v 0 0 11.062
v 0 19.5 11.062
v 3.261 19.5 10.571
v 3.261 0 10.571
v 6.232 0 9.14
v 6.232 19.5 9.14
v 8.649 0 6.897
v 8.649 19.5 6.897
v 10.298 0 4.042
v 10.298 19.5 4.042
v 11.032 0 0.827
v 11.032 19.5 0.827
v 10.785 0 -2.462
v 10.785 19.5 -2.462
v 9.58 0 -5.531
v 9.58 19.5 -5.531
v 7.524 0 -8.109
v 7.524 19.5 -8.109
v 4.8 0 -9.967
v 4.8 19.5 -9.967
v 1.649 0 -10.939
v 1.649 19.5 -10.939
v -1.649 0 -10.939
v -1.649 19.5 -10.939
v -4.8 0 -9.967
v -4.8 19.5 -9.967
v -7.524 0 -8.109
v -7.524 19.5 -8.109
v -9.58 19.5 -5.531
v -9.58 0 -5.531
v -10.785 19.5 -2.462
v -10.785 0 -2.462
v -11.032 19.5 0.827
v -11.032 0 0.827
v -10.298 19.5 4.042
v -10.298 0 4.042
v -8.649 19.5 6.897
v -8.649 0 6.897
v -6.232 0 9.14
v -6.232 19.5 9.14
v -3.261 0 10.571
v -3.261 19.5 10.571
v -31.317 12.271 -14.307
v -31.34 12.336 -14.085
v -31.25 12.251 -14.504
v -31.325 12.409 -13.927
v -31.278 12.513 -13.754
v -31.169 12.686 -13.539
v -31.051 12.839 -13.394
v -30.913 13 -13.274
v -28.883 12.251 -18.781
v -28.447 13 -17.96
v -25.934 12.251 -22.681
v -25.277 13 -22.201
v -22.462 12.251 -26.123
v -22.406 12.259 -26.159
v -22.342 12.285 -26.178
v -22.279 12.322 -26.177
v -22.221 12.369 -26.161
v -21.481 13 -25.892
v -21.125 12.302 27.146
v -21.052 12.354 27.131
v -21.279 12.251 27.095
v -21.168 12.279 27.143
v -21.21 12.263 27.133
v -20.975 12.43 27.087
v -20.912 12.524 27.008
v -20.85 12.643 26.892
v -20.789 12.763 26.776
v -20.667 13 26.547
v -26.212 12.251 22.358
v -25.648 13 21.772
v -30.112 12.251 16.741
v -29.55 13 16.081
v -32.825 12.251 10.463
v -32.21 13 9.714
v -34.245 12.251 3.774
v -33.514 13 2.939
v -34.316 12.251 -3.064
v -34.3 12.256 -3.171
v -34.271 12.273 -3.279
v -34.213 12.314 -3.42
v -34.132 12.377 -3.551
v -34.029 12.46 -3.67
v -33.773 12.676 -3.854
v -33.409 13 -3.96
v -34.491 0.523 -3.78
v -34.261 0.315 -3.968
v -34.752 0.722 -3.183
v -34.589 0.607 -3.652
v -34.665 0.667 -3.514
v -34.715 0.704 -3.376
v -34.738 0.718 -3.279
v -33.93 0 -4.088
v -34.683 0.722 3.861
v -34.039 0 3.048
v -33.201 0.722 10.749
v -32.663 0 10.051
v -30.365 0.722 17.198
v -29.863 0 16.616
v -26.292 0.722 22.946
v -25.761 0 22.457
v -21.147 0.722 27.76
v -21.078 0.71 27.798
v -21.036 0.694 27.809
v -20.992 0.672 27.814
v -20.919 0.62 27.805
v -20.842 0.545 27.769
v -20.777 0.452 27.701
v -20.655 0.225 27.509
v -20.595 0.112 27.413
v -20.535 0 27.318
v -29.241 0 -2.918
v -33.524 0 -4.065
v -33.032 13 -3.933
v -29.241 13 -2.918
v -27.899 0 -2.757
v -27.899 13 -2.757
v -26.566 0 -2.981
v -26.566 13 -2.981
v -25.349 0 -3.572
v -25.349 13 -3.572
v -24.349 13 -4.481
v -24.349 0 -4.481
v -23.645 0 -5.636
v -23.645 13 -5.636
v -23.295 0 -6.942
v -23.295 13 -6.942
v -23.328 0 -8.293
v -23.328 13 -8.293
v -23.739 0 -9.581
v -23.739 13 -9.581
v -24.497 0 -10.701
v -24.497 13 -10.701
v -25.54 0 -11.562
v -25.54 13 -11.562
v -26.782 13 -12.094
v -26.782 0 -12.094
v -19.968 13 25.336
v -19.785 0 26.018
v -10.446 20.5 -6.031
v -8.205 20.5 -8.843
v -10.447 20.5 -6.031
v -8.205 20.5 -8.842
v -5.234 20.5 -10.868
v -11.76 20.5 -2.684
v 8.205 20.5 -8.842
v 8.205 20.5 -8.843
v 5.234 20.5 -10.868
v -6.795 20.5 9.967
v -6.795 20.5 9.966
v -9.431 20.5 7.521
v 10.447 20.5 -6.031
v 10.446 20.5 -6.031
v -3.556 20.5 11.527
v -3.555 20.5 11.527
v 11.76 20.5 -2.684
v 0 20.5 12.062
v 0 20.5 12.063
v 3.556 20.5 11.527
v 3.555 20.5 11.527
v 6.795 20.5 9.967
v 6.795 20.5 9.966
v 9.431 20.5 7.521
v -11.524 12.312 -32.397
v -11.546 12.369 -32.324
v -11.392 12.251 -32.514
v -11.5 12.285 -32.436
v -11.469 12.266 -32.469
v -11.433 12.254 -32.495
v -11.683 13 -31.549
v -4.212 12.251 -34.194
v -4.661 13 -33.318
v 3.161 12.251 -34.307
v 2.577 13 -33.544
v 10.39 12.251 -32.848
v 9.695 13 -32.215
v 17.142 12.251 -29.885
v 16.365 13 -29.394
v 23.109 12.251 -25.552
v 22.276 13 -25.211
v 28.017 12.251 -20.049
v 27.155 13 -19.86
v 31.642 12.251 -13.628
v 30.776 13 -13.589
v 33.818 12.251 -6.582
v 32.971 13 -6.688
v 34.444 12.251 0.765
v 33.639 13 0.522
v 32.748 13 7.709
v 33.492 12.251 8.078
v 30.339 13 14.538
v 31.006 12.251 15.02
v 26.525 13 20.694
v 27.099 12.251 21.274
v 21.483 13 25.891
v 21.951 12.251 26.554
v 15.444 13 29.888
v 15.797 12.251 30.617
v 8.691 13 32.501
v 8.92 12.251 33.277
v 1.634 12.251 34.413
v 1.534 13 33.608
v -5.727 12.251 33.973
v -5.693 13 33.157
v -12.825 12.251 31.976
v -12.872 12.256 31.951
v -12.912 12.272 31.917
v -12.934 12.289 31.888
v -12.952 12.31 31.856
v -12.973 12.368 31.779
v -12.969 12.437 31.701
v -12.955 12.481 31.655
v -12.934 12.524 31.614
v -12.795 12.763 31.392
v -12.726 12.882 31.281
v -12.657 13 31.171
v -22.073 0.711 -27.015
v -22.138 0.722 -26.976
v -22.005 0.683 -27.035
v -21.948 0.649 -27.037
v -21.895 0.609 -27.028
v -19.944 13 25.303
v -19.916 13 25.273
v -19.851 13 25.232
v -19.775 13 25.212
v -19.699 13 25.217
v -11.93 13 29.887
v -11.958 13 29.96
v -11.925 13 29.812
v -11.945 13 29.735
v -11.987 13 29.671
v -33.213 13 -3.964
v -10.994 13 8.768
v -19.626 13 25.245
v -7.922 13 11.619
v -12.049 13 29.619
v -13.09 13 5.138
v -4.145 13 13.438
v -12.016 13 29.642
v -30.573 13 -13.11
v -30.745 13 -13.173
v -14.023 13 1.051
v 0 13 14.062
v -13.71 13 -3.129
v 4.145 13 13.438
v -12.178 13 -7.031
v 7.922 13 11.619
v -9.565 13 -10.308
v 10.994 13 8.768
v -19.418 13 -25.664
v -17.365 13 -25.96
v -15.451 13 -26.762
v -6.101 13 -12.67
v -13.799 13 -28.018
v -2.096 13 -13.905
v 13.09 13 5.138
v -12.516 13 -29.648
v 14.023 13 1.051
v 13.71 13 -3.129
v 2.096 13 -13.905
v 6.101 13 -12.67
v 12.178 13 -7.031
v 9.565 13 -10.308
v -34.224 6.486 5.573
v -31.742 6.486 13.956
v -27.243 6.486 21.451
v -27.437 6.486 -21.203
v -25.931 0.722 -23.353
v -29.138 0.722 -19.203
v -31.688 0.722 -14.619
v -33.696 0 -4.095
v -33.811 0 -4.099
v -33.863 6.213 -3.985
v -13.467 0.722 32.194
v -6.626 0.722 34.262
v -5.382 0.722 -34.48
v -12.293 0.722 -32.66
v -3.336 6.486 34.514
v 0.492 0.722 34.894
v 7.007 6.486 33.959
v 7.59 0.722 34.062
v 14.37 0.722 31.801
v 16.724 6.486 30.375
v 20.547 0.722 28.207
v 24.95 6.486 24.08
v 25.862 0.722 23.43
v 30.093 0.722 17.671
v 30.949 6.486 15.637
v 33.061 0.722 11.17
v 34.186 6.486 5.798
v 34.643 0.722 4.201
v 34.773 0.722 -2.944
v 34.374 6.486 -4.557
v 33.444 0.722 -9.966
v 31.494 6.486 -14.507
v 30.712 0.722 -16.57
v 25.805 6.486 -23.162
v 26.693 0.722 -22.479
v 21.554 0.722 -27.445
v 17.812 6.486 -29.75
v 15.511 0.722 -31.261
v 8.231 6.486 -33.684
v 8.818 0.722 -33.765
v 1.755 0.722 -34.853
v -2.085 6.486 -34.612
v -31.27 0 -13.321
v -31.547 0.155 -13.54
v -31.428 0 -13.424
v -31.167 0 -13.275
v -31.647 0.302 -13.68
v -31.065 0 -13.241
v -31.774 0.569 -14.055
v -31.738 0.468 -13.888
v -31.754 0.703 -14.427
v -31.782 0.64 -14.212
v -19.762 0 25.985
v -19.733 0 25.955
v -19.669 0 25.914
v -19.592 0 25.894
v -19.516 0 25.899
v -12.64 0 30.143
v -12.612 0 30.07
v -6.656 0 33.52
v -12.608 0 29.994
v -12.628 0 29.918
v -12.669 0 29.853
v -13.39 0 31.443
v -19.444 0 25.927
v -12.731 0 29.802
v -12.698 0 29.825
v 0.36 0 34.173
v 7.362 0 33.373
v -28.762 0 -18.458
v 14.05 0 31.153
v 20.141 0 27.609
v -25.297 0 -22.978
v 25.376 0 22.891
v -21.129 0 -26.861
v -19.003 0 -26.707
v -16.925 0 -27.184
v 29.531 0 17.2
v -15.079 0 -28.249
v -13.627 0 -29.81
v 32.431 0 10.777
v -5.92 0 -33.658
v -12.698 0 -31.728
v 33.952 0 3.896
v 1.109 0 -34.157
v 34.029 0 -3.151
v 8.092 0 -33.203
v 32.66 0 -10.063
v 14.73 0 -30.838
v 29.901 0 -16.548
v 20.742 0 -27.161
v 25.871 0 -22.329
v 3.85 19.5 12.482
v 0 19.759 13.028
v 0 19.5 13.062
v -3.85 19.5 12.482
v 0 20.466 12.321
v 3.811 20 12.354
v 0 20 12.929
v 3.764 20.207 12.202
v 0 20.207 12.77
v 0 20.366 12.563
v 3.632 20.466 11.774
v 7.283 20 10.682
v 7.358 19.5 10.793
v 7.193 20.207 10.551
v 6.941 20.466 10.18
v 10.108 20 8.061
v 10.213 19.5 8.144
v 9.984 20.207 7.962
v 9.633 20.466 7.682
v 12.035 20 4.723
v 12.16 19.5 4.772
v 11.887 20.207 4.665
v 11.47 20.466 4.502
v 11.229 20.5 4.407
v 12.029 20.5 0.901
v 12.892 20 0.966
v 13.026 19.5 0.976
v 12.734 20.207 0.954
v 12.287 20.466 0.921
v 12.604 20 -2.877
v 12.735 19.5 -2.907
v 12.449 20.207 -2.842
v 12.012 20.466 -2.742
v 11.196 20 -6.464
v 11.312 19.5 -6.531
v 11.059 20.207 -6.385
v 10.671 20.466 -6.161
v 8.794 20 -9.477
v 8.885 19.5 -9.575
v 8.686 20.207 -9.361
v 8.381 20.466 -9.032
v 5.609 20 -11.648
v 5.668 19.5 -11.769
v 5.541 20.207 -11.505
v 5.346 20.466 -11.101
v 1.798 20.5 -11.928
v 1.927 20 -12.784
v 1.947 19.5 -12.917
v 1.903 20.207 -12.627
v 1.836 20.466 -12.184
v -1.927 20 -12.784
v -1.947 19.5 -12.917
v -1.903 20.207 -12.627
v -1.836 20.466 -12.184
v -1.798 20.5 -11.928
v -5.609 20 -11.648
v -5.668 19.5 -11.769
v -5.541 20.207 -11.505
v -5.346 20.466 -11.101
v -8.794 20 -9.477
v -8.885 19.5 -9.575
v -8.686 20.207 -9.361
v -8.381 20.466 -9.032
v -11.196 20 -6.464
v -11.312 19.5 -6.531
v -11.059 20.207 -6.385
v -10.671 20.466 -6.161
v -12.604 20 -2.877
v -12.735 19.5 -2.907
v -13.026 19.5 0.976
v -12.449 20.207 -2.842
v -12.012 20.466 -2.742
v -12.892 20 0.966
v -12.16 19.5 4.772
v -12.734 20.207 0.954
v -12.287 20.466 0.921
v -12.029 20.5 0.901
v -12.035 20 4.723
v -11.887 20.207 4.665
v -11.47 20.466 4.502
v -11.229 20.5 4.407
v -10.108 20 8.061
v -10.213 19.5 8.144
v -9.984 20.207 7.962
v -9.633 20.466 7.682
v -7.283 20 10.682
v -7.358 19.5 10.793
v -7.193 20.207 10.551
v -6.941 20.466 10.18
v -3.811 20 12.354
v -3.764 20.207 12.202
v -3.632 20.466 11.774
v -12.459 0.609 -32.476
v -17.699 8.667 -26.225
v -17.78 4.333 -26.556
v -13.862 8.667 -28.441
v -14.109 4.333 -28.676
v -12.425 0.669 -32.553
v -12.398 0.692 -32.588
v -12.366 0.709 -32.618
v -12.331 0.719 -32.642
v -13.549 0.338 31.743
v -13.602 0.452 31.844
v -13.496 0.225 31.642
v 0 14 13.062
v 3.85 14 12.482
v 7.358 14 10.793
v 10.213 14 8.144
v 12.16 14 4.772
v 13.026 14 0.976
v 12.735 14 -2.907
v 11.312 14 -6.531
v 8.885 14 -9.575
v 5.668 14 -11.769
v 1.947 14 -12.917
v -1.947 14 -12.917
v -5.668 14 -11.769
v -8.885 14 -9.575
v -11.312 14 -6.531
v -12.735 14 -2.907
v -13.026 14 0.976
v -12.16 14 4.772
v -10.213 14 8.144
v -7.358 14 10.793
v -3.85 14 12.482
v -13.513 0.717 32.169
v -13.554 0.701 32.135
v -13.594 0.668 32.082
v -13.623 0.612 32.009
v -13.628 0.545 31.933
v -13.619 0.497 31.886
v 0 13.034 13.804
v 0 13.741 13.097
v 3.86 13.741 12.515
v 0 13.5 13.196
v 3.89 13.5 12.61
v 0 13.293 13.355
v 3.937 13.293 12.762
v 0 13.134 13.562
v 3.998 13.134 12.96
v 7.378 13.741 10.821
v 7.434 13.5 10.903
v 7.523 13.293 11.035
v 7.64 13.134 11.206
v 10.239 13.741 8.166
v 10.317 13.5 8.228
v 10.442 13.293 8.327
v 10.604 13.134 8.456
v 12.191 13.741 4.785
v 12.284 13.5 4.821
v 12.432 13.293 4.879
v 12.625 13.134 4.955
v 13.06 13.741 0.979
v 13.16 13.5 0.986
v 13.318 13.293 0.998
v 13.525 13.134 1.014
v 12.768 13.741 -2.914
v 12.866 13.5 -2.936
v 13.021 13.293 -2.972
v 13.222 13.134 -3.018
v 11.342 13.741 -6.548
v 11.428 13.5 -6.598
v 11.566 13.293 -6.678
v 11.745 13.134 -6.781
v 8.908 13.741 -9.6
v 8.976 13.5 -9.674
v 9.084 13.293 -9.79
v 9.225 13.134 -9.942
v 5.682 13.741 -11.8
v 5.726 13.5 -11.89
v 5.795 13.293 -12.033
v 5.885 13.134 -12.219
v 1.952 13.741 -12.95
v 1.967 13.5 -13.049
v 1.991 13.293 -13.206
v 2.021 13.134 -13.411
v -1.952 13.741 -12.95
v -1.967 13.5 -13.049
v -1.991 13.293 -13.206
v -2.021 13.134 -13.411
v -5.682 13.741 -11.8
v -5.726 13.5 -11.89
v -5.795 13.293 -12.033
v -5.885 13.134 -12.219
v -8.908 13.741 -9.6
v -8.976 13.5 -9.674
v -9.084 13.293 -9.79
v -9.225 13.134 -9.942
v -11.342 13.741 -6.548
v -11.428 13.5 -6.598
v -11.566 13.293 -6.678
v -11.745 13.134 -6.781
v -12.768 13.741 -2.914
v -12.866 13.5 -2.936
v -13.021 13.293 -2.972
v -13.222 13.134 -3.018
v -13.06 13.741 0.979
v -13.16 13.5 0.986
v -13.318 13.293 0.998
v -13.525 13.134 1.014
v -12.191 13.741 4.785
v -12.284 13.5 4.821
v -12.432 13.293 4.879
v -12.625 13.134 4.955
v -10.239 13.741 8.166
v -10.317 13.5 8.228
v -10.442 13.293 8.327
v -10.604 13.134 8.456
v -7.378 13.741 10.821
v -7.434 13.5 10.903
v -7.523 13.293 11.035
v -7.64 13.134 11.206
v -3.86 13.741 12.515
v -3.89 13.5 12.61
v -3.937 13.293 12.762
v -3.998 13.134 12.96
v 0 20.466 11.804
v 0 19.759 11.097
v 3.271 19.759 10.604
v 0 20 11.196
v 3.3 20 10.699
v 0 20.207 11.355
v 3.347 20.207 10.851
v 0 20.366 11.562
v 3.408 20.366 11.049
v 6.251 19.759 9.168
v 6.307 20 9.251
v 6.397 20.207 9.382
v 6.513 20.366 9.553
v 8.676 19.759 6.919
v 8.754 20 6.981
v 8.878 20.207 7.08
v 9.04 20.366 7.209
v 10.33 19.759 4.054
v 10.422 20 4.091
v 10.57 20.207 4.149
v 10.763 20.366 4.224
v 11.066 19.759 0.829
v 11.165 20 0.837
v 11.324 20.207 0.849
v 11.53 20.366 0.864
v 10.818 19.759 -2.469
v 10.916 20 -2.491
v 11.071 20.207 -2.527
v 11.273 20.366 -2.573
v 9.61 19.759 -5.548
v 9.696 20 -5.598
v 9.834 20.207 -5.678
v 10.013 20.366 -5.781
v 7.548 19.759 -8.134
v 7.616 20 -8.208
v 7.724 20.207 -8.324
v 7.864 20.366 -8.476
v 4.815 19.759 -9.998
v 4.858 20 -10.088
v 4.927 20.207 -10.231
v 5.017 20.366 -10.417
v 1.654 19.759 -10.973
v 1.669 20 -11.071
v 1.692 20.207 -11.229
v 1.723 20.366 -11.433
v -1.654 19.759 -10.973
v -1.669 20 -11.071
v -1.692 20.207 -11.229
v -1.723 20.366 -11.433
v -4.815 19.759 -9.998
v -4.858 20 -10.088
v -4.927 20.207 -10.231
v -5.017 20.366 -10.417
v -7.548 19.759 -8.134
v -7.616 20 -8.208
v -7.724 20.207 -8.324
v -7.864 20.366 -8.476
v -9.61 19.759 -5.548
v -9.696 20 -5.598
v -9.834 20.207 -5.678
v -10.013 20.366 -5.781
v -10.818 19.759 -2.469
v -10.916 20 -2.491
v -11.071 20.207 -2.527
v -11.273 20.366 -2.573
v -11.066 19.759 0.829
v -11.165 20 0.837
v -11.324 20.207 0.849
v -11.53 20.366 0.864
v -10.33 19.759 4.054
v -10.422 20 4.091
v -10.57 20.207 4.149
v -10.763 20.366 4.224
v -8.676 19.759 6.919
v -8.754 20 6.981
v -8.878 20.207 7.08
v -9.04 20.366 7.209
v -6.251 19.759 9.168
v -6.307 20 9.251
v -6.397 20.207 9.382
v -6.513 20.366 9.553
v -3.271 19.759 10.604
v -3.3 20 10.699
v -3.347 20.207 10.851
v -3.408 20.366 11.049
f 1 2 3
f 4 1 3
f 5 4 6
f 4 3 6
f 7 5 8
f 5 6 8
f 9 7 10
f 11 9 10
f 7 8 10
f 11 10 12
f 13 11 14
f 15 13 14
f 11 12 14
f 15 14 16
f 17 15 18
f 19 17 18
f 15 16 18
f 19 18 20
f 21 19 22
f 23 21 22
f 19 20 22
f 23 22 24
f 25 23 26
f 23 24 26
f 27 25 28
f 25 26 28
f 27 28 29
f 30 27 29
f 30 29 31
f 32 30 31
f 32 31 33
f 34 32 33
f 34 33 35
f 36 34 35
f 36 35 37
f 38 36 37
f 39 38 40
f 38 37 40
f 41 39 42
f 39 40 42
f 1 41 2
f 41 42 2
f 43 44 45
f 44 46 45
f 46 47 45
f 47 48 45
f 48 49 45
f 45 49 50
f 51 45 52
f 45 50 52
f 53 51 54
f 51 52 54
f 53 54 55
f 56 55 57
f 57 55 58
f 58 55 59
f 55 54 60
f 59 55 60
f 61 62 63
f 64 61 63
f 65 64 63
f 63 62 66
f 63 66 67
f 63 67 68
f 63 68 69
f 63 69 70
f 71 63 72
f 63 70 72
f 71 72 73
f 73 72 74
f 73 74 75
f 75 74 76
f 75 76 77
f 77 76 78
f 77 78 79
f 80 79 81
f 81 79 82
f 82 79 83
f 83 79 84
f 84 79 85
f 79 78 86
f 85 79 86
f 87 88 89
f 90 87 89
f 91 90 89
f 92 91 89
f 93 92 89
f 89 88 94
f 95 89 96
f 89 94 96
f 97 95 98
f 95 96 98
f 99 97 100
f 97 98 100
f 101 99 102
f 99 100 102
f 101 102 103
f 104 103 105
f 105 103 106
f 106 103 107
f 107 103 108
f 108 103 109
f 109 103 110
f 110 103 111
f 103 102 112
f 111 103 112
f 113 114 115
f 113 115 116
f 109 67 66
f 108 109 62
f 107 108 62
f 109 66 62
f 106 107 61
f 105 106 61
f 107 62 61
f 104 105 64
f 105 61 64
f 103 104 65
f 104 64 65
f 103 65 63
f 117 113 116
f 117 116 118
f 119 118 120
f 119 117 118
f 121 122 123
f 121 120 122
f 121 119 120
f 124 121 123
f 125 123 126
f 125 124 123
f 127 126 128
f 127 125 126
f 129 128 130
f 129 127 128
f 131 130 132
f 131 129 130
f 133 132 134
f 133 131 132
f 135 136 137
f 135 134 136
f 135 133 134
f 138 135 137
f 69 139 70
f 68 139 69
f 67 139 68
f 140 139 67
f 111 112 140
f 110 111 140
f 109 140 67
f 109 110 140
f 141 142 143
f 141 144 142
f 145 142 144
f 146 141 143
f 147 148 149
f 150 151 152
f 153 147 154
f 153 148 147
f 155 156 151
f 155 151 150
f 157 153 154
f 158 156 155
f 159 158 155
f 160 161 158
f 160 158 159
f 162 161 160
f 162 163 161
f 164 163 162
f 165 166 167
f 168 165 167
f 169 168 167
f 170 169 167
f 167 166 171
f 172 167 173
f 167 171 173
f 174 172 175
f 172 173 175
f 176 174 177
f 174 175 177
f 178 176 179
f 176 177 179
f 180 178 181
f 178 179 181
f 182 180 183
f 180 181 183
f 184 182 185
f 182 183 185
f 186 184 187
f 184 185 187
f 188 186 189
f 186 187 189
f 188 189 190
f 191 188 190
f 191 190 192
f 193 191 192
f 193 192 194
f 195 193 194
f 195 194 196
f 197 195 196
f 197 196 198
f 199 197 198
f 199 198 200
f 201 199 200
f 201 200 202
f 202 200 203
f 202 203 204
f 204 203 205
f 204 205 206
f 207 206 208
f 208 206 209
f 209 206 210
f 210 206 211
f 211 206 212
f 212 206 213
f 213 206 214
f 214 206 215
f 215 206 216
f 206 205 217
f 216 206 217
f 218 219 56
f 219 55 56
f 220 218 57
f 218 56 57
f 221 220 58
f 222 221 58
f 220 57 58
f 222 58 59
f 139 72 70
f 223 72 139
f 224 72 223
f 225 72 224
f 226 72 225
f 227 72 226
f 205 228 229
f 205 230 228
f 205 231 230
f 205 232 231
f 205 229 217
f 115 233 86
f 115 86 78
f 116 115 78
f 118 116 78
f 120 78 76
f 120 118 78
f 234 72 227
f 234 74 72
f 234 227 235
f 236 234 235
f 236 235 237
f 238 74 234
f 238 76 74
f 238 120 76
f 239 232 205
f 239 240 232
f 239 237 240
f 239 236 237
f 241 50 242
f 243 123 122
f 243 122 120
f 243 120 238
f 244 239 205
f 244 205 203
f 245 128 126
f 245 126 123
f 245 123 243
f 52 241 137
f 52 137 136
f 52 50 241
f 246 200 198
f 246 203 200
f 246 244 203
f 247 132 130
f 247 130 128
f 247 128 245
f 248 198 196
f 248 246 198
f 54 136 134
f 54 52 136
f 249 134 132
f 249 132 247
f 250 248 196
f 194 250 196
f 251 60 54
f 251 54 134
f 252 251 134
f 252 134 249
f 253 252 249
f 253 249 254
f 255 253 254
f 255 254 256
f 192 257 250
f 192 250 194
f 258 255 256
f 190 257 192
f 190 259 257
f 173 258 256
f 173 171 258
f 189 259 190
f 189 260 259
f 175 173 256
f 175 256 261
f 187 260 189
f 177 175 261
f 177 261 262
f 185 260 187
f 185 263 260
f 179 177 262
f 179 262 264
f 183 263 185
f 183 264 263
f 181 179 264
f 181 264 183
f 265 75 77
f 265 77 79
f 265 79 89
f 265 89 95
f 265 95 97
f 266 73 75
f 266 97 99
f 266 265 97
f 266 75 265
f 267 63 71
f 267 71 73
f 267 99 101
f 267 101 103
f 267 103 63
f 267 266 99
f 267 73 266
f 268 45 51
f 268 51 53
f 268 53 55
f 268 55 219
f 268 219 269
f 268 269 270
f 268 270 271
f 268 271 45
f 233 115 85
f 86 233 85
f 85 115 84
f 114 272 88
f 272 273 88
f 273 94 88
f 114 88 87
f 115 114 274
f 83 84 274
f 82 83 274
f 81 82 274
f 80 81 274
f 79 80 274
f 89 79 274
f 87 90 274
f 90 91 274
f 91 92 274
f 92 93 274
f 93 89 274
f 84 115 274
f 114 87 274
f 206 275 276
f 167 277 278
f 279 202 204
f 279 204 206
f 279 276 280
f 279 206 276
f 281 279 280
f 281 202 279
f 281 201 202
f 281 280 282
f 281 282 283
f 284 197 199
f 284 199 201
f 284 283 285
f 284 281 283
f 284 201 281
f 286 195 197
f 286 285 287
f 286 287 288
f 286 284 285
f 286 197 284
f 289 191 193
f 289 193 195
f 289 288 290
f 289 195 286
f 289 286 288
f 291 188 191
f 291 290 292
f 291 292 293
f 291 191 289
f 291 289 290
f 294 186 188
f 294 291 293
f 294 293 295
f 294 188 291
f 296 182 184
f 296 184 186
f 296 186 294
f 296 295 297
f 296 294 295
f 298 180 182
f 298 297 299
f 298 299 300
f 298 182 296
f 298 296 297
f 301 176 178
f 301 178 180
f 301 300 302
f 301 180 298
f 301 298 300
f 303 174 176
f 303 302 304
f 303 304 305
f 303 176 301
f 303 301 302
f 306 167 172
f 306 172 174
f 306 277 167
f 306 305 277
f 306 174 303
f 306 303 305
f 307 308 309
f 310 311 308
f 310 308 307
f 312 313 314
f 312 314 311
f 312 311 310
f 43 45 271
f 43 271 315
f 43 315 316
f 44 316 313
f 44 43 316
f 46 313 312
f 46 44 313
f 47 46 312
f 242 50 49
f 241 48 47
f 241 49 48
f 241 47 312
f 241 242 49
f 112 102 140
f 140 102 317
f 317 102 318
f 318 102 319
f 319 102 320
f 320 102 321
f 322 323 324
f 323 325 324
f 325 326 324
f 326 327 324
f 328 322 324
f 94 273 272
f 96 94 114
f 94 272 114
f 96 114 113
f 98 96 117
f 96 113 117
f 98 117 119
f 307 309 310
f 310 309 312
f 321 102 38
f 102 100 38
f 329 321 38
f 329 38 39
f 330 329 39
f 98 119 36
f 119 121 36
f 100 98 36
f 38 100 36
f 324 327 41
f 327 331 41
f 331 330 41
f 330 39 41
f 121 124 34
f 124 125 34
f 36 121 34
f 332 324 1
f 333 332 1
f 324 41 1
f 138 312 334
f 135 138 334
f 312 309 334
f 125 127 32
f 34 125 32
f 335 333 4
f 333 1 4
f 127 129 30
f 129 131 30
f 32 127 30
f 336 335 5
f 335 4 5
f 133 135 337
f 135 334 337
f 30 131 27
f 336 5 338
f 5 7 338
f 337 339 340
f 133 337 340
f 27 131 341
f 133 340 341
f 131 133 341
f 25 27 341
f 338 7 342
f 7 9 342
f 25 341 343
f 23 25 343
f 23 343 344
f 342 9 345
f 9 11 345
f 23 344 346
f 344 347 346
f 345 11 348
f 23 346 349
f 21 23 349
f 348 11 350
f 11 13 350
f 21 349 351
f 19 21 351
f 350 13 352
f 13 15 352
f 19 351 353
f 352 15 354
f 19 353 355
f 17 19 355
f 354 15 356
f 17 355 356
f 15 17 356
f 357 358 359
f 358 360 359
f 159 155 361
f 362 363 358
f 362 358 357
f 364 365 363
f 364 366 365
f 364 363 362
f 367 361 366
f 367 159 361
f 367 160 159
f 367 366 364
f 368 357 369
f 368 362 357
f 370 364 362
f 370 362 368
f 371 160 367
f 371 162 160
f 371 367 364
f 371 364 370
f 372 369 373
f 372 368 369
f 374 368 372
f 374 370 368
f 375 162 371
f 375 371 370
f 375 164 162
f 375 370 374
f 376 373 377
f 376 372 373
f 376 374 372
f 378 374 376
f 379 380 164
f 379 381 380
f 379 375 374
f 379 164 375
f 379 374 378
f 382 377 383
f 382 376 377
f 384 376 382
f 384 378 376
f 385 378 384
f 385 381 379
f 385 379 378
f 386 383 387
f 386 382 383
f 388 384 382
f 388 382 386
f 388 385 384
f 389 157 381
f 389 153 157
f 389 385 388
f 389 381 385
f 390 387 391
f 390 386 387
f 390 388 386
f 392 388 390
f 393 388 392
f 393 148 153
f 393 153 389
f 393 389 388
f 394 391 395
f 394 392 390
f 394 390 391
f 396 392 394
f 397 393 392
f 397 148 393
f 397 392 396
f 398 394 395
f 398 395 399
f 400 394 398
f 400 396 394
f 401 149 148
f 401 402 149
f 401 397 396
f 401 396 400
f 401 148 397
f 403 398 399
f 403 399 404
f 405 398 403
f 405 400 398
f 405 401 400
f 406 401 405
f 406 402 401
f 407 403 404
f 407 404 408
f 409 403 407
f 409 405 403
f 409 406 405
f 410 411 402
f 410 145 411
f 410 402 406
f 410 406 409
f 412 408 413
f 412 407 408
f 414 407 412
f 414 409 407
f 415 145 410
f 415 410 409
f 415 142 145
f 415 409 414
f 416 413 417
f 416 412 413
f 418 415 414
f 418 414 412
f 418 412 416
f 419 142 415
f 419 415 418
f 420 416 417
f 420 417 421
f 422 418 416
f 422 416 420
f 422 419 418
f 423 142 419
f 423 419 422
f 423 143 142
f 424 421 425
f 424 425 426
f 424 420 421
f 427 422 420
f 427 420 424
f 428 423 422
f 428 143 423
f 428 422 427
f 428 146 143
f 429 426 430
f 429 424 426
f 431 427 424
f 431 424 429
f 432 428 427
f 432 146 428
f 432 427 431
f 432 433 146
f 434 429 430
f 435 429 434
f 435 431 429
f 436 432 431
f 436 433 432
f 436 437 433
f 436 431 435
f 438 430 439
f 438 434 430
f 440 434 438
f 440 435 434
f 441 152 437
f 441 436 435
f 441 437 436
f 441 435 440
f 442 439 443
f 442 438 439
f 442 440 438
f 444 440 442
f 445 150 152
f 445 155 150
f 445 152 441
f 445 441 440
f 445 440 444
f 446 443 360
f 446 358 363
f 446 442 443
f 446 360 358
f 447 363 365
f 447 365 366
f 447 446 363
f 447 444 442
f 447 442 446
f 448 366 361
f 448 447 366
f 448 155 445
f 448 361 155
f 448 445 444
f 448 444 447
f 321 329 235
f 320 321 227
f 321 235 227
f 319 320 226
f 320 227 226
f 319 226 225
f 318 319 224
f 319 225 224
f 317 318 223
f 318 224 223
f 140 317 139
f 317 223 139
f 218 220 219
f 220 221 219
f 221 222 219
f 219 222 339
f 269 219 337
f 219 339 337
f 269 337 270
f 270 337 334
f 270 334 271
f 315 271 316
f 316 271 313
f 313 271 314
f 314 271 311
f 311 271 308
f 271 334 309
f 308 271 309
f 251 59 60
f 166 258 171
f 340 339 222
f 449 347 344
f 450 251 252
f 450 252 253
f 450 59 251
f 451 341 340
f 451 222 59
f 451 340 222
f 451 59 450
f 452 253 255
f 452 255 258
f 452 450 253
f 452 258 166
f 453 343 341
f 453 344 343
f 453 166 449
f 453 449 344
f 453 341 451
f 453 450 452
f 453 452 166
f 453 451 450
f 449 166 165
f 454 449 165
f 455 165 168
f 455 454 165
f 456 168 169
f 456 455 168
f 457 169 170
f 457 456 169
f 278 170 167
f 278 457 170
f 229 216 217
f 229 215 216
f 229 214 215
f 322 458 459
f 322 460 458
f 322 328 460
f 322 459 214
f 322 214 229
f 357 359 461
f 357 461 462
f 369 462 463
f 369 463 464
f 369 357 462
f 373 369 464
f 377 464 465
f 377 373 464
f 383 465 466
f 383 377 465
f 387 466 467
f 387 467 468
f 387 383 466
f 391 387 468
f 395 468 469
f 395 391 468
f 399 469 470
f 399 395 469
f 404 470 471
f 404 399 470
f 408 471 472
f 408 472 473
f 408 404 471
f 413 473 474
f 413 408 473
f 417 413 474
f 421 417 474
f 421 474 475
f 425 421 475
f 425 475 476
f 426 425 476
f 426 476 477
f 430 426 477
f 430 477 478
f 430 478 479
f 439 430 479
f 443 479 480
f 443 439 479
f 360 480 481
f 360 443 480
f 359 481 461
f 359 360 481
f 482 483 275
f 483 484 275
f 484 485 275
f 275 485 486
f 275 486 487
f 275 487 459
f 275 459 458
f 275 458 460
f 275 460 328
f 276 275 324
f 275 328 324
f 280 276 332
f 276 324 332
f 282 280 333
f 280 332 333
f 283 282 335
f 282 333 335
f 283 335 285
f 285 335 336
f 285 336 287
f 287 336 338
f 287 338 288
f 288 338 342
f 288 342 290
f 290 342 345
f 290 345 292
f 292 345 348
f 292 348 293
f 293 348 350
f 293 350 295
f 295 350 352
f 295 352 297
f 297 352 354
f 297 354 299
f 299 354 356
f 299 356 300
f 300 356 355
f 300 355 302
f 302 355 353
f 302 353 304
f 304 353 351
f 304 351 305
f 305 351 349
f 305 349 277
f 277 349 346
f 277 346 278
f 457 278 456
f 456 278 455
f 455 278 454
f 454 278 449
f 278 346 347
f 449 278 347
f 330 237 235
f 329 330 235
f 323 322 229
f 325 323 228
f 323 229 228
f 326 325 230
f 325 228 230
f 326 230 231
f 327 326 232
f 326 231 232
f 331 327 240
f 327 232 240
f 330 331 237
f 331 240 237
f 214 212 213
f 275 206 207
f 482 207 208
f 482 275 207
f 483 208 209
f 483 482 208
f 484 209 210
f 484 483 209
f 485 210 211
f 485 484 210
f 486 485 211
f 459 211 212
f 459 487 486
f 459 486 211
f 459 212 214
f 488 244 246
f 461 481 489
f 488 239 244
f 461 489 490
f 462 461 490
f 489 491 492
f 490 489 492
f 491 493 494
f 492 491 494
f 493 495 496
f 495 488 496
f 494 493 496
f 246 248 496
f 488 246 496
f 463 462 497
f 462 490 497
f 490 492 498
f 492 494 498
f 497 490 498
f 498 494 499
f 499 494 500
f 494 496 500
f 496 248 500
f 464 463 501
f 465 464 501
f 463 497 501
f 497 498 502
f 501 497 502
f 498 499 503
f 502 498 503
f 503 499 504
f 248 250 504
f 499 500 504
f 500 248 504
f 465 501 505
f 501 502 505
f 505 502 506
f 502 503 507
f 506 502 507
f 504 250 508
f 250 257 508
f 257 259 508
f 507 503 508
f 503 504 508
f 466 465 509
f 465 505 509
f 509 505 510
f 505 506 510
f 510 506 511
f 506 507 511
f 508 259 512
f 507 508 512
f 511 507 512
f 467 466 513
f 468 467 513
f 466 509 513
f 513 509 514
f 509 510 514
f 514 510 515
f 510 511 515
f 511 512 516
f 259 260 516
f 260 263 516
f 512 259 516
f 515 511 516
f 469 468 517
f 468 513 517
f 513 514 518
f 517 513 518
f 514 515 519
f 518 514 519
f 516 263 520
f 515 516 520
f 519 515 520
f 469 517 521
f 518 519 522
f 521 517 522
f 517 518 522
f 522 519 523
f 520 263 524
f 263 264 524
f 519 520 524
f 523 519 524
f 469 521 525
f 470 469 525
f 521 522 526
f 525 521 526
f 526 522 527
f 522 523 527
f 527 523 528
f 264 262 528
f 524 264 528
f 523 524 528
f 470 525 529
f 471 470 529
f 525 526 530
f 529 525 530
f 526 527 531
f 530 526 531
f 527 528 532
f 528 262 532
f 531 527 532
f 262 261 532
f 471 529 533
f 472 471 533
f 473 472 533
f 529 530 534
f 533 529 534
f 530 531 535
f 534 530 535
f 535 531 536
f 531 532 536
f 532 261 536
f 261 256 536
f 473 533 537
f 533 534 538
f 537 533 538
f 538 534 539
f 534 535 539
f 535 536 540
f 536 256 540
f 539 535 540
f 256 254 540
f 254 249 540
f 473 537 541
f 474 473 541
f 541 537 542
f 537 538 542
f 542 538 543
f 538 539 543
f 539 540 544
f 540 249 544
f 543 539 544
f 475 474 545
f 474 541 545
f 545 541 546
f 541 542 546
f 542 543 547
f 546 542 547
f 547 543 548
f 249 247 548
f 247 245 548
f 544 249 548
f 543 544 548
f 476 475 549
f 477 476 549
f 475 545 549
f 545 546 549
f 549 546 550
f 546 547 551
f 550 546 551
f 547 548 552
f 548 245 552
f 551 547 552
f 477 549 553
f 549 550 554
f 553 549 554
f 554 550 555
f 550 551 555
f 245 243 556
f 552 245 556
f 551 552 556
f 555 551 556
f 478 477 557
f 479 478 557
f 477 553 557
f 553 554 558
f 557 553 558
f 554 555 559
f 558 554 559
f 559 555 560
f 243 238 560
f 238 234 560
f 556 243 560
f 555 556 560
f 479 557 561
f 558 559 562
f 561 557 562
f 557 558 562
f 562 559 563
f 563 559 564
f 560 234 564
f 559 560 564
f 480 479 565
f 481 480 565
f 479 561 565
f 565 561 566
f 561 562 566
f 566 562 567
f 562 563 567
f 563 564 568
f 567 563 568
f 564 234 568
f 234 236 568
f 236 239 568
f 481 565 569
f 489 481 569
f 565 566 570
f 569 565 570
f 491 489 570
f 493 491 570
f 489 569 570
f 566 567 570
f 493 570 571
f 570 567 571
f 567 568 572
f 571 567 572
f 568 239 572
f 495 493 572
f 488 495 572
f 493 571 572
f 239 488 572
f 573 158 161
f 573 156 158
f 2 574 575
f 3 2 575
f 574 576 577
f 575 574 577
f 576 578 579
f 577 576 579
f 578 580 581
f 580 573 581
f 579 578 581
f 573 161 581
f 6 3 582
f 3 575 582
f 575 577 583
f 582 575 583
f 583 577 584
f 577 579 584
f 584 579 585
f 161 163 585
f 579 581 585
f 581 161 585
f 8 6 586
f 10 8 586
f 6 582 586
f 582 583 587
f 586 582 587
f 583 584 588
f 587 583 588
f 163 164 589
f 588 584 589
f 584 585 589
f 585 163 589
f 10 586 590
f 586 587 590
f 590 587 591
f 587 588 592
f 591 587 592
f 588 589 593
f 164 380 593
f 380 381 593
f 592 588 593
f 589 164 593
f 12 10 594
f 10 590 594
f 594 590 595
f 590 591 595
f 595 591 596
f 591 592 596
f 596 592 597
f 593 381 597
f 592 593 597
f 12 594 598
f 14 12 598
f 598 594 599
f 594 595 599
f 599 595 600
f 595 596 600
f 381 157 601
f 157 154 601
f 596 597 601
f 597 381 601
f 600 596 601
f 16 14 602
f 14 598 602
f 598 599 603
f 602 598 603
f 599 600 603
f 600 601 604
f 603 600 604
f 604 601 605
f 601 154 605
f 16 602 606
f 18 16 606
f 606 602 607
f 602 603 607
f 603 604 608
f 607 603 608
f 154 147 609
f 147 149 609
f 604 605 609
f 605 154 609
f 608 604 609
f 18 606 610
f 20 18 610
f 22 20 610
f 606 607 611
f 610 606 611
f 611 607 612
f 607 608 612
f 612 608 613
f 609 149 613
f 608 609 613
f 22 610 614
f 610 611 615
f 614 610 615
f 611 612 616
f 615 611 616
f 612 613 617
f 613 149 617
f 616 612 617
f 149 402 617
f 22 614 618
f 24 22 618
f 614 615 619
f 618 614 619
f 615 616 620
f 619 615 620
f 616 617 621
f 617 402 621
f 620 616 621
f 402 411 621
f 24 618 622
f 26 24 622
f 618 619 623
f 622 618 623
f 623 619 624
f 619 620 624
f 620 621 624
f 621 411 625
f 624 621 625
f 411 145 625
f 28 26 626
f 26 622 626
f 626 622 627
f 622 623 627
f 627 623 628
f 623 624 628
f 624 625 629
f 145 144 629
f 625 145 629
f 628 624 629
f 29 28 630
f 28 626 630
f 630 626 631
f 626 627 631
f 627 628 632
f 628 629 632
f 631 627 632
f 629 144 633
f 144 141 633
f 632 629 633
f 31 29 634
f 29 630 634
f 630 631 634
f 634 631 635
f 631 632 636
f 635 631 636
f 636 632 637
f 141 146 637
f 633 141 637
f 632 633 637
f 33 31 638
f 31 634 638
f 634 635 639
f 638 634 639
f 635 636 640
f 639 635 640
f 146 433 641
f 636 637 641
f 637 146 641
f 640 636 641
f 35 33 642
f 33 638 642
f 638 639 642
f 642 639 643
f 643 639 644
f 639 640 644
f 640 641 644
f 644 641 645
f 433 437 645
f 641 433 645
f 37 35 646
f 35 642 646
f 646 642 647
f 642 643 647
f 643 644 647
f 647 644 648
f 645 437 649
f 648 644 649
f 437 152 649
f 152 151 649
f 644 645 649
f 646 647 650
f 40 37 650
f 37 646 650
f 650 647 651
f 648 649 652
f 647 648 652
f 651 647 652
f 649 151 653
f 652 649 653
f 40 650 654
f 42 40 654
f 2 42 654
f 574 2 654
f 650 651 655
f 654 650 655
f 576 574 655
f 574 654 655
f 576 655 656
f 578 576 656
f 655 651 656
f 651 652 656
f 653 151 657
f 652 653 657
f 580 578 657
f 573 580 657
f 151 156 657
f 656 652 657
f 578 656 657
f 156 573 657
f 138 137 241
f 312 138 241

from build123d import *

# Parameters (mm, degrees)
SKETCH1_R           = 34.925
BOSS_EXTRUDE1_DEPTH = 13
BOSS_EXTRUDE1_TAPER = 2.21
CHAMFER1_SIZE       = 0.722669775
CHAMFER1_SIZE_2     = 0.75
CHAMFER1_SIZE_3     = 0.780685639
CUT_EXTRUDE1_DEPTH  = 13
CUT_EXTRUDE1_DRAFT  = -4.5
CUT_EXTRUDE2_DEPTH  = 13
CUT_EXTRUDE2_DRAFT  = -2.2
CUT_EXTRUDE4_DEPTH  = 17.5
FILLET1_R           = 0.25
SKETCH6_R           = 11.0625
CUT_EXTRUDE3_DEPTH  = 13
BOSS_EXTRUDE2_START = 7.5
SKETCH7_R           = 13.0625
SKETCH7_R_2         = 11.0625
BOSS_EXTRUDE2_DEPTH = 7.5
FILLET2_R           = 1


# Some blends are built 0.0001 mm under size
with BuildPart() as part:
    # Sketch1 → Boss-Extrude1 (new body)
    with BuildSketch(Plane(origin=(0, 0, 0), x_dir=(1, 0, 0), z_dir=(0, 1, 0))):
        Circle(SKETCH1_R)
    extrude(amount=BOSS_EXTRUDE1_DEPTH, taper=BOSS_EXTRUDE1_TAPER)

    # Chamfer1
    # the kernel refuses this chamfer: 0.780685639, 0.75, 0.722669775 mm, written as the material it takes off along each edge
    with BuildSketch(Plane(origin=(0, 0, 0), x_dir=(1, 0, 0), z_dir=(0, 0, 1))) as chamfer1_piece_1:
        Polygon((34.925 - CHAMFER1_SIZE * 0.038562212794, CHAMFER1_SIZE * 0.999256201571), (34.925 - CHAMFER1_SIZE_2, 0), (34.925, 0), align=None)
    revolve(axis=Axis((0, 0, 0), (0, 1, 0)), mode=Mode.SUBTRACT)
    with BuildSketch(Plane(origin=(0, 13, 0), x_dir=(1, 0, 0), z_dir=(0, 0, -1))) as chamfer1_piece_2:
        Polygon((34.423318083 + CHAMFER1_SIZE_2 * 0.0385622127818, CHAMFER1_SIZE_2 * 0.999256201254), (34.423318083 - CHAMFER1_SIZE_3, 0), (34.423318083, 0), align=None)
    revolve(axis=Axis((0, 13, 0), (0, -1, 0)), mode=Mode.SUBTRACT)


with BuildPart() as cut_extrude1_tool:
    # Sketch3 → Cut-Extrude1 (with draft: the straight prism first)
    with BuildSketch(Plane(origin=(0, 0, 0), x_dir=(1, 0, 0), z_dir=(0, 1, 0))):
        with BuildLine():
            ThreePointArc((-22.007744855, 27.11853225), (-15.962331288, 27.647568798), (-12.481465414, 32.61853225))
            ThreePointArc((-12.481465414, 32.61853225), (-17.4625, 30.245937227), (-22.007744855, 27.11853225))
        make_face()
    extrude(amount=CUT_EXTRUDE1_DEPTH)
    # Cut-Extrude1: the draft: its side faces are tilted about the plane it starts from
    cut_extrude1_sides = [cut_extrude1_tool.faces().sort_by_distance(p)[0] for p in [
        (-15.962331288, 6.5, -27.647568798),
        (-17.4625, 6.5, -30.245937227),
    ]]
    draft(cut_extrude1_sides, Plane(origin=(0, 0, 0), x_dir=(1, 0, 0), z_dir=(0, 1, 0)), CUT_EXTRUDE1_DRAFT)


with BuildPart() as part_1:
    add(part.part)

    # Cut-Extrude1: cut by cut_extrude1_tool
    add(cut_extrude1_tool.part, mode=Mode.SUBTRACT)


with BuildPart() as cut_extrude2_tool:
    # Sketch5 → Cut-Extrude2 (with draft: the straight prism first)
    with BuildSketch(Plane(origin=(0, 0, 0), x_dir=(1, 0, 0), z_dir=(0, 1, 0))):
        Polygon((-12.515145209, -29.926867367), (-19.659854791, -25.801867367), (-22.409854791, -30.565007088), (-15.265145209, -34.690007088), align=None)
    extrude(amount=CUT_EXTRUDE2_DEPTH)
    # Cut-Extrude2: the draft: its side faces are tilted about the plane it starts from
    cut_extrude2_sides = [cut_extrude2_tool.faces().sort_by_distance(p)[0] for p in [
        (-16.0875, 6.5, 27.864367367),
        (-21.034854791, 6.5, 28.183437227),
        (-18.8375, 6.5, 32.627507088),
        (-13.890145209, 6.5, 32.308437227),
    ]]
    draft(cut_extrude2_sides, Plane(origin=(0, 0, 0), x_dir=(1, 0, 0), z_dir=(0, 1, 0)), CUT_EXTRUDE2_DRAFT)


with BuildPart() as part_2:
    add(part_1.part)

    # Cut-Extrude2: cut by cut_extrude2_tool
    add(cut_extrude2_tool.part, mode=Mode.SUBTRACT)

    # Sketch8 → Cut-Extrude4 (cut)
    with BuildSketch(Plane.XZ):
        with BuildLine():
            Line((-26.782458498, -12.093899983), (-34.509865108, -14.164452344))
            ThreePointArc((-34.509865108, -14.164452344), (-40.327403248, -10.805695133), (-36.968646037, -4.988156994))
            Line((-36.968646037, -4.988156994), (-29.241239427, -2.917604633))
            ThreePointArc((-29.241239427, -2.917604633), (-23.423701288, -6.276361844), (-26.782458498, -12.093899983))
        make_face()
    extrude(amount=-CUT_EXTRUDE4_DEPTH, mode=Mode.SUBTRACT)

    # Fillet1
    fillet1_edges = [part_2.edges().sort_by_distance(p)[0] for p in [
        (-12.174042092, 6.5, 29.835469062),
        (-19.751253095, 6.5, 25.46076425),
        (-13.410686626, 6.486385182, 31.976354169),
        (-20.986991717, 6.486385182, 27.602172385),
        (-22.192531964, 6.486342052, -26.642548455),
        (-11.976857671, 6.486342043, -32.54057076),
    ]]
    fillet(fillet1_edges, radius=FILLET1_R)

    # Sketch6 → Cut-Extrude3 (cut)
    with BuildSketch(Plane(origin=(0, 13, 0), x_dir=(1, 0, 0), z_dir=(0, 1, 0))):
        with Locations(Location((0, 0, 0), (0, 0, 270))):
            Circle(SKETCH6_R)
    extrude(amount=-CUT_EXTRUDE3_DEPTH, mode=Mode.SUBTRACT)

    # Sketch7 → Boss-Extrude2 (add)
    with BuildSketch(Plane(origin=(0, 13, 0), x_dir=(1, 0, 0), z_dir=(0, 1, 0)).offset(BOSS_EXTRUDE2_START)):
        with Locations(Location((0, 0, 0), (0, 0, 270))):
            Circle(SKETCH7_R)
        with Locations(Location((0, 0, 0), (0, 0, 270))):
            Circle(SKETCH7_R_2, mode=Mode.SUBTRACT)
    extrude(amount=-BOSS_EXTRUDE2_DEPTH)

    # Fillet2
    fillet2_edges = [part_2.edges().sort_by_distance(p)[0] for p in [
        (0, 20.5, -11.0625),
        (0, 20.5, -13.0625),
        (0, 13, -13.0625),
        (-34.406108256, 6.505188254, -4.301527065),
        (-31.947327327, 6.505188254, -13.477822415),
    ]]
    fillet(fillet2_edges, radius=FILLET2_R - 0.0001)  # a hair under: the kernel refuses the full size


solid = part_2.part
